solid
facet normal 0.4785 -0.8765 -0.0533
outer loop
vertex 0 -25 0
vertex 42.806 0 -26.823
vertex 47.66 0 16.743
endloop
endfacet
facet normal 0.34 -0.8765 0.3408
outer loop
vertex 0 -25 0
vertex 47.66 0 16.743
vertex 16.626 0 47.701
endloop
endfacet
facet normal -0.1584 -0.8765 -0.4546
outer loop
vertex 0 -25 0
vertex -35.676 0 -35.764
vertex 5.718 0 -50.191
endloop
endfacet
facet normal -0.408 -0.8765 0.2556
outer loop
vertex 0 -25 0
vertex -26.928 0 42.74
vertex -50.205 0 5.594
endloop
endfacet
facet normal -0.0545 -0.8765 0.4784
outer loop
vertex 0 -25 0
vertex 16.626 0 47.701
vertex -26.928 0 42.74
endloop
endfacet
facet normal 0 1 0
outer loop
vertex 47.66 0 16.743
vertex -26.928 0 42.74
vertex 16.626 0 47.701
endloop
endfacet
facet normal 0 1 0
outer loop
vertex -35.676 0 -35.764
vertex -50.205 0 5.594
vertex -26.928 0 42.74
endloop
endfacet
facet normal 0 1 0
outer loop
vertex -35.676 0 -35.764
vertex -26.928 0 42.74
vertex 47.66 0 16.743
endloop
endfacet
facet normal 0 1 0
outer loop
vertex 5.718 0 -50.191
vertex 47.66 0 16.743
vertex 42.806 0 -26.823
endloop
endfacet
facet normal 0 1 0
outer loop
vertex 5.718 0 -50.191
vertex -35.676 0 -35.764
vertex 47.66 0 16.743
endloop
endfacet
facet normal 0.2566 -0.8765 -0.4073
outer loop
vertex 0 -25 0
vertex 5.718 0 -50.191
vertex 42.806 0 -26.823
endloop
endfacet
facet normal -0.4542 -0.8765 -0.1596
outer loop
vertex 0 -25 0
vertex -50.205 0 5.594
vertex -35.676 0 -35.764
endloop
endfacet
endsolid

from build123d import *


with BuildPart() as f3:
    # F0 (on Front) → F3 section 0
    with BuildSketch(Plane.XZ, mode=Mode.PRIVATE) as f3_s0:
        Polygon((-26.928486, 42.739754), (-50.204922, 5.594263), (-35.676027, -35.763822), (5.717643, -50.19102), (42.805812, -26.823356), (47.660331, 16.742842), (16.625649, 47.701339), align=None)
    loft([f3_s0.sketch, Vertex(0, -25, 0)])


solid = f3.part
